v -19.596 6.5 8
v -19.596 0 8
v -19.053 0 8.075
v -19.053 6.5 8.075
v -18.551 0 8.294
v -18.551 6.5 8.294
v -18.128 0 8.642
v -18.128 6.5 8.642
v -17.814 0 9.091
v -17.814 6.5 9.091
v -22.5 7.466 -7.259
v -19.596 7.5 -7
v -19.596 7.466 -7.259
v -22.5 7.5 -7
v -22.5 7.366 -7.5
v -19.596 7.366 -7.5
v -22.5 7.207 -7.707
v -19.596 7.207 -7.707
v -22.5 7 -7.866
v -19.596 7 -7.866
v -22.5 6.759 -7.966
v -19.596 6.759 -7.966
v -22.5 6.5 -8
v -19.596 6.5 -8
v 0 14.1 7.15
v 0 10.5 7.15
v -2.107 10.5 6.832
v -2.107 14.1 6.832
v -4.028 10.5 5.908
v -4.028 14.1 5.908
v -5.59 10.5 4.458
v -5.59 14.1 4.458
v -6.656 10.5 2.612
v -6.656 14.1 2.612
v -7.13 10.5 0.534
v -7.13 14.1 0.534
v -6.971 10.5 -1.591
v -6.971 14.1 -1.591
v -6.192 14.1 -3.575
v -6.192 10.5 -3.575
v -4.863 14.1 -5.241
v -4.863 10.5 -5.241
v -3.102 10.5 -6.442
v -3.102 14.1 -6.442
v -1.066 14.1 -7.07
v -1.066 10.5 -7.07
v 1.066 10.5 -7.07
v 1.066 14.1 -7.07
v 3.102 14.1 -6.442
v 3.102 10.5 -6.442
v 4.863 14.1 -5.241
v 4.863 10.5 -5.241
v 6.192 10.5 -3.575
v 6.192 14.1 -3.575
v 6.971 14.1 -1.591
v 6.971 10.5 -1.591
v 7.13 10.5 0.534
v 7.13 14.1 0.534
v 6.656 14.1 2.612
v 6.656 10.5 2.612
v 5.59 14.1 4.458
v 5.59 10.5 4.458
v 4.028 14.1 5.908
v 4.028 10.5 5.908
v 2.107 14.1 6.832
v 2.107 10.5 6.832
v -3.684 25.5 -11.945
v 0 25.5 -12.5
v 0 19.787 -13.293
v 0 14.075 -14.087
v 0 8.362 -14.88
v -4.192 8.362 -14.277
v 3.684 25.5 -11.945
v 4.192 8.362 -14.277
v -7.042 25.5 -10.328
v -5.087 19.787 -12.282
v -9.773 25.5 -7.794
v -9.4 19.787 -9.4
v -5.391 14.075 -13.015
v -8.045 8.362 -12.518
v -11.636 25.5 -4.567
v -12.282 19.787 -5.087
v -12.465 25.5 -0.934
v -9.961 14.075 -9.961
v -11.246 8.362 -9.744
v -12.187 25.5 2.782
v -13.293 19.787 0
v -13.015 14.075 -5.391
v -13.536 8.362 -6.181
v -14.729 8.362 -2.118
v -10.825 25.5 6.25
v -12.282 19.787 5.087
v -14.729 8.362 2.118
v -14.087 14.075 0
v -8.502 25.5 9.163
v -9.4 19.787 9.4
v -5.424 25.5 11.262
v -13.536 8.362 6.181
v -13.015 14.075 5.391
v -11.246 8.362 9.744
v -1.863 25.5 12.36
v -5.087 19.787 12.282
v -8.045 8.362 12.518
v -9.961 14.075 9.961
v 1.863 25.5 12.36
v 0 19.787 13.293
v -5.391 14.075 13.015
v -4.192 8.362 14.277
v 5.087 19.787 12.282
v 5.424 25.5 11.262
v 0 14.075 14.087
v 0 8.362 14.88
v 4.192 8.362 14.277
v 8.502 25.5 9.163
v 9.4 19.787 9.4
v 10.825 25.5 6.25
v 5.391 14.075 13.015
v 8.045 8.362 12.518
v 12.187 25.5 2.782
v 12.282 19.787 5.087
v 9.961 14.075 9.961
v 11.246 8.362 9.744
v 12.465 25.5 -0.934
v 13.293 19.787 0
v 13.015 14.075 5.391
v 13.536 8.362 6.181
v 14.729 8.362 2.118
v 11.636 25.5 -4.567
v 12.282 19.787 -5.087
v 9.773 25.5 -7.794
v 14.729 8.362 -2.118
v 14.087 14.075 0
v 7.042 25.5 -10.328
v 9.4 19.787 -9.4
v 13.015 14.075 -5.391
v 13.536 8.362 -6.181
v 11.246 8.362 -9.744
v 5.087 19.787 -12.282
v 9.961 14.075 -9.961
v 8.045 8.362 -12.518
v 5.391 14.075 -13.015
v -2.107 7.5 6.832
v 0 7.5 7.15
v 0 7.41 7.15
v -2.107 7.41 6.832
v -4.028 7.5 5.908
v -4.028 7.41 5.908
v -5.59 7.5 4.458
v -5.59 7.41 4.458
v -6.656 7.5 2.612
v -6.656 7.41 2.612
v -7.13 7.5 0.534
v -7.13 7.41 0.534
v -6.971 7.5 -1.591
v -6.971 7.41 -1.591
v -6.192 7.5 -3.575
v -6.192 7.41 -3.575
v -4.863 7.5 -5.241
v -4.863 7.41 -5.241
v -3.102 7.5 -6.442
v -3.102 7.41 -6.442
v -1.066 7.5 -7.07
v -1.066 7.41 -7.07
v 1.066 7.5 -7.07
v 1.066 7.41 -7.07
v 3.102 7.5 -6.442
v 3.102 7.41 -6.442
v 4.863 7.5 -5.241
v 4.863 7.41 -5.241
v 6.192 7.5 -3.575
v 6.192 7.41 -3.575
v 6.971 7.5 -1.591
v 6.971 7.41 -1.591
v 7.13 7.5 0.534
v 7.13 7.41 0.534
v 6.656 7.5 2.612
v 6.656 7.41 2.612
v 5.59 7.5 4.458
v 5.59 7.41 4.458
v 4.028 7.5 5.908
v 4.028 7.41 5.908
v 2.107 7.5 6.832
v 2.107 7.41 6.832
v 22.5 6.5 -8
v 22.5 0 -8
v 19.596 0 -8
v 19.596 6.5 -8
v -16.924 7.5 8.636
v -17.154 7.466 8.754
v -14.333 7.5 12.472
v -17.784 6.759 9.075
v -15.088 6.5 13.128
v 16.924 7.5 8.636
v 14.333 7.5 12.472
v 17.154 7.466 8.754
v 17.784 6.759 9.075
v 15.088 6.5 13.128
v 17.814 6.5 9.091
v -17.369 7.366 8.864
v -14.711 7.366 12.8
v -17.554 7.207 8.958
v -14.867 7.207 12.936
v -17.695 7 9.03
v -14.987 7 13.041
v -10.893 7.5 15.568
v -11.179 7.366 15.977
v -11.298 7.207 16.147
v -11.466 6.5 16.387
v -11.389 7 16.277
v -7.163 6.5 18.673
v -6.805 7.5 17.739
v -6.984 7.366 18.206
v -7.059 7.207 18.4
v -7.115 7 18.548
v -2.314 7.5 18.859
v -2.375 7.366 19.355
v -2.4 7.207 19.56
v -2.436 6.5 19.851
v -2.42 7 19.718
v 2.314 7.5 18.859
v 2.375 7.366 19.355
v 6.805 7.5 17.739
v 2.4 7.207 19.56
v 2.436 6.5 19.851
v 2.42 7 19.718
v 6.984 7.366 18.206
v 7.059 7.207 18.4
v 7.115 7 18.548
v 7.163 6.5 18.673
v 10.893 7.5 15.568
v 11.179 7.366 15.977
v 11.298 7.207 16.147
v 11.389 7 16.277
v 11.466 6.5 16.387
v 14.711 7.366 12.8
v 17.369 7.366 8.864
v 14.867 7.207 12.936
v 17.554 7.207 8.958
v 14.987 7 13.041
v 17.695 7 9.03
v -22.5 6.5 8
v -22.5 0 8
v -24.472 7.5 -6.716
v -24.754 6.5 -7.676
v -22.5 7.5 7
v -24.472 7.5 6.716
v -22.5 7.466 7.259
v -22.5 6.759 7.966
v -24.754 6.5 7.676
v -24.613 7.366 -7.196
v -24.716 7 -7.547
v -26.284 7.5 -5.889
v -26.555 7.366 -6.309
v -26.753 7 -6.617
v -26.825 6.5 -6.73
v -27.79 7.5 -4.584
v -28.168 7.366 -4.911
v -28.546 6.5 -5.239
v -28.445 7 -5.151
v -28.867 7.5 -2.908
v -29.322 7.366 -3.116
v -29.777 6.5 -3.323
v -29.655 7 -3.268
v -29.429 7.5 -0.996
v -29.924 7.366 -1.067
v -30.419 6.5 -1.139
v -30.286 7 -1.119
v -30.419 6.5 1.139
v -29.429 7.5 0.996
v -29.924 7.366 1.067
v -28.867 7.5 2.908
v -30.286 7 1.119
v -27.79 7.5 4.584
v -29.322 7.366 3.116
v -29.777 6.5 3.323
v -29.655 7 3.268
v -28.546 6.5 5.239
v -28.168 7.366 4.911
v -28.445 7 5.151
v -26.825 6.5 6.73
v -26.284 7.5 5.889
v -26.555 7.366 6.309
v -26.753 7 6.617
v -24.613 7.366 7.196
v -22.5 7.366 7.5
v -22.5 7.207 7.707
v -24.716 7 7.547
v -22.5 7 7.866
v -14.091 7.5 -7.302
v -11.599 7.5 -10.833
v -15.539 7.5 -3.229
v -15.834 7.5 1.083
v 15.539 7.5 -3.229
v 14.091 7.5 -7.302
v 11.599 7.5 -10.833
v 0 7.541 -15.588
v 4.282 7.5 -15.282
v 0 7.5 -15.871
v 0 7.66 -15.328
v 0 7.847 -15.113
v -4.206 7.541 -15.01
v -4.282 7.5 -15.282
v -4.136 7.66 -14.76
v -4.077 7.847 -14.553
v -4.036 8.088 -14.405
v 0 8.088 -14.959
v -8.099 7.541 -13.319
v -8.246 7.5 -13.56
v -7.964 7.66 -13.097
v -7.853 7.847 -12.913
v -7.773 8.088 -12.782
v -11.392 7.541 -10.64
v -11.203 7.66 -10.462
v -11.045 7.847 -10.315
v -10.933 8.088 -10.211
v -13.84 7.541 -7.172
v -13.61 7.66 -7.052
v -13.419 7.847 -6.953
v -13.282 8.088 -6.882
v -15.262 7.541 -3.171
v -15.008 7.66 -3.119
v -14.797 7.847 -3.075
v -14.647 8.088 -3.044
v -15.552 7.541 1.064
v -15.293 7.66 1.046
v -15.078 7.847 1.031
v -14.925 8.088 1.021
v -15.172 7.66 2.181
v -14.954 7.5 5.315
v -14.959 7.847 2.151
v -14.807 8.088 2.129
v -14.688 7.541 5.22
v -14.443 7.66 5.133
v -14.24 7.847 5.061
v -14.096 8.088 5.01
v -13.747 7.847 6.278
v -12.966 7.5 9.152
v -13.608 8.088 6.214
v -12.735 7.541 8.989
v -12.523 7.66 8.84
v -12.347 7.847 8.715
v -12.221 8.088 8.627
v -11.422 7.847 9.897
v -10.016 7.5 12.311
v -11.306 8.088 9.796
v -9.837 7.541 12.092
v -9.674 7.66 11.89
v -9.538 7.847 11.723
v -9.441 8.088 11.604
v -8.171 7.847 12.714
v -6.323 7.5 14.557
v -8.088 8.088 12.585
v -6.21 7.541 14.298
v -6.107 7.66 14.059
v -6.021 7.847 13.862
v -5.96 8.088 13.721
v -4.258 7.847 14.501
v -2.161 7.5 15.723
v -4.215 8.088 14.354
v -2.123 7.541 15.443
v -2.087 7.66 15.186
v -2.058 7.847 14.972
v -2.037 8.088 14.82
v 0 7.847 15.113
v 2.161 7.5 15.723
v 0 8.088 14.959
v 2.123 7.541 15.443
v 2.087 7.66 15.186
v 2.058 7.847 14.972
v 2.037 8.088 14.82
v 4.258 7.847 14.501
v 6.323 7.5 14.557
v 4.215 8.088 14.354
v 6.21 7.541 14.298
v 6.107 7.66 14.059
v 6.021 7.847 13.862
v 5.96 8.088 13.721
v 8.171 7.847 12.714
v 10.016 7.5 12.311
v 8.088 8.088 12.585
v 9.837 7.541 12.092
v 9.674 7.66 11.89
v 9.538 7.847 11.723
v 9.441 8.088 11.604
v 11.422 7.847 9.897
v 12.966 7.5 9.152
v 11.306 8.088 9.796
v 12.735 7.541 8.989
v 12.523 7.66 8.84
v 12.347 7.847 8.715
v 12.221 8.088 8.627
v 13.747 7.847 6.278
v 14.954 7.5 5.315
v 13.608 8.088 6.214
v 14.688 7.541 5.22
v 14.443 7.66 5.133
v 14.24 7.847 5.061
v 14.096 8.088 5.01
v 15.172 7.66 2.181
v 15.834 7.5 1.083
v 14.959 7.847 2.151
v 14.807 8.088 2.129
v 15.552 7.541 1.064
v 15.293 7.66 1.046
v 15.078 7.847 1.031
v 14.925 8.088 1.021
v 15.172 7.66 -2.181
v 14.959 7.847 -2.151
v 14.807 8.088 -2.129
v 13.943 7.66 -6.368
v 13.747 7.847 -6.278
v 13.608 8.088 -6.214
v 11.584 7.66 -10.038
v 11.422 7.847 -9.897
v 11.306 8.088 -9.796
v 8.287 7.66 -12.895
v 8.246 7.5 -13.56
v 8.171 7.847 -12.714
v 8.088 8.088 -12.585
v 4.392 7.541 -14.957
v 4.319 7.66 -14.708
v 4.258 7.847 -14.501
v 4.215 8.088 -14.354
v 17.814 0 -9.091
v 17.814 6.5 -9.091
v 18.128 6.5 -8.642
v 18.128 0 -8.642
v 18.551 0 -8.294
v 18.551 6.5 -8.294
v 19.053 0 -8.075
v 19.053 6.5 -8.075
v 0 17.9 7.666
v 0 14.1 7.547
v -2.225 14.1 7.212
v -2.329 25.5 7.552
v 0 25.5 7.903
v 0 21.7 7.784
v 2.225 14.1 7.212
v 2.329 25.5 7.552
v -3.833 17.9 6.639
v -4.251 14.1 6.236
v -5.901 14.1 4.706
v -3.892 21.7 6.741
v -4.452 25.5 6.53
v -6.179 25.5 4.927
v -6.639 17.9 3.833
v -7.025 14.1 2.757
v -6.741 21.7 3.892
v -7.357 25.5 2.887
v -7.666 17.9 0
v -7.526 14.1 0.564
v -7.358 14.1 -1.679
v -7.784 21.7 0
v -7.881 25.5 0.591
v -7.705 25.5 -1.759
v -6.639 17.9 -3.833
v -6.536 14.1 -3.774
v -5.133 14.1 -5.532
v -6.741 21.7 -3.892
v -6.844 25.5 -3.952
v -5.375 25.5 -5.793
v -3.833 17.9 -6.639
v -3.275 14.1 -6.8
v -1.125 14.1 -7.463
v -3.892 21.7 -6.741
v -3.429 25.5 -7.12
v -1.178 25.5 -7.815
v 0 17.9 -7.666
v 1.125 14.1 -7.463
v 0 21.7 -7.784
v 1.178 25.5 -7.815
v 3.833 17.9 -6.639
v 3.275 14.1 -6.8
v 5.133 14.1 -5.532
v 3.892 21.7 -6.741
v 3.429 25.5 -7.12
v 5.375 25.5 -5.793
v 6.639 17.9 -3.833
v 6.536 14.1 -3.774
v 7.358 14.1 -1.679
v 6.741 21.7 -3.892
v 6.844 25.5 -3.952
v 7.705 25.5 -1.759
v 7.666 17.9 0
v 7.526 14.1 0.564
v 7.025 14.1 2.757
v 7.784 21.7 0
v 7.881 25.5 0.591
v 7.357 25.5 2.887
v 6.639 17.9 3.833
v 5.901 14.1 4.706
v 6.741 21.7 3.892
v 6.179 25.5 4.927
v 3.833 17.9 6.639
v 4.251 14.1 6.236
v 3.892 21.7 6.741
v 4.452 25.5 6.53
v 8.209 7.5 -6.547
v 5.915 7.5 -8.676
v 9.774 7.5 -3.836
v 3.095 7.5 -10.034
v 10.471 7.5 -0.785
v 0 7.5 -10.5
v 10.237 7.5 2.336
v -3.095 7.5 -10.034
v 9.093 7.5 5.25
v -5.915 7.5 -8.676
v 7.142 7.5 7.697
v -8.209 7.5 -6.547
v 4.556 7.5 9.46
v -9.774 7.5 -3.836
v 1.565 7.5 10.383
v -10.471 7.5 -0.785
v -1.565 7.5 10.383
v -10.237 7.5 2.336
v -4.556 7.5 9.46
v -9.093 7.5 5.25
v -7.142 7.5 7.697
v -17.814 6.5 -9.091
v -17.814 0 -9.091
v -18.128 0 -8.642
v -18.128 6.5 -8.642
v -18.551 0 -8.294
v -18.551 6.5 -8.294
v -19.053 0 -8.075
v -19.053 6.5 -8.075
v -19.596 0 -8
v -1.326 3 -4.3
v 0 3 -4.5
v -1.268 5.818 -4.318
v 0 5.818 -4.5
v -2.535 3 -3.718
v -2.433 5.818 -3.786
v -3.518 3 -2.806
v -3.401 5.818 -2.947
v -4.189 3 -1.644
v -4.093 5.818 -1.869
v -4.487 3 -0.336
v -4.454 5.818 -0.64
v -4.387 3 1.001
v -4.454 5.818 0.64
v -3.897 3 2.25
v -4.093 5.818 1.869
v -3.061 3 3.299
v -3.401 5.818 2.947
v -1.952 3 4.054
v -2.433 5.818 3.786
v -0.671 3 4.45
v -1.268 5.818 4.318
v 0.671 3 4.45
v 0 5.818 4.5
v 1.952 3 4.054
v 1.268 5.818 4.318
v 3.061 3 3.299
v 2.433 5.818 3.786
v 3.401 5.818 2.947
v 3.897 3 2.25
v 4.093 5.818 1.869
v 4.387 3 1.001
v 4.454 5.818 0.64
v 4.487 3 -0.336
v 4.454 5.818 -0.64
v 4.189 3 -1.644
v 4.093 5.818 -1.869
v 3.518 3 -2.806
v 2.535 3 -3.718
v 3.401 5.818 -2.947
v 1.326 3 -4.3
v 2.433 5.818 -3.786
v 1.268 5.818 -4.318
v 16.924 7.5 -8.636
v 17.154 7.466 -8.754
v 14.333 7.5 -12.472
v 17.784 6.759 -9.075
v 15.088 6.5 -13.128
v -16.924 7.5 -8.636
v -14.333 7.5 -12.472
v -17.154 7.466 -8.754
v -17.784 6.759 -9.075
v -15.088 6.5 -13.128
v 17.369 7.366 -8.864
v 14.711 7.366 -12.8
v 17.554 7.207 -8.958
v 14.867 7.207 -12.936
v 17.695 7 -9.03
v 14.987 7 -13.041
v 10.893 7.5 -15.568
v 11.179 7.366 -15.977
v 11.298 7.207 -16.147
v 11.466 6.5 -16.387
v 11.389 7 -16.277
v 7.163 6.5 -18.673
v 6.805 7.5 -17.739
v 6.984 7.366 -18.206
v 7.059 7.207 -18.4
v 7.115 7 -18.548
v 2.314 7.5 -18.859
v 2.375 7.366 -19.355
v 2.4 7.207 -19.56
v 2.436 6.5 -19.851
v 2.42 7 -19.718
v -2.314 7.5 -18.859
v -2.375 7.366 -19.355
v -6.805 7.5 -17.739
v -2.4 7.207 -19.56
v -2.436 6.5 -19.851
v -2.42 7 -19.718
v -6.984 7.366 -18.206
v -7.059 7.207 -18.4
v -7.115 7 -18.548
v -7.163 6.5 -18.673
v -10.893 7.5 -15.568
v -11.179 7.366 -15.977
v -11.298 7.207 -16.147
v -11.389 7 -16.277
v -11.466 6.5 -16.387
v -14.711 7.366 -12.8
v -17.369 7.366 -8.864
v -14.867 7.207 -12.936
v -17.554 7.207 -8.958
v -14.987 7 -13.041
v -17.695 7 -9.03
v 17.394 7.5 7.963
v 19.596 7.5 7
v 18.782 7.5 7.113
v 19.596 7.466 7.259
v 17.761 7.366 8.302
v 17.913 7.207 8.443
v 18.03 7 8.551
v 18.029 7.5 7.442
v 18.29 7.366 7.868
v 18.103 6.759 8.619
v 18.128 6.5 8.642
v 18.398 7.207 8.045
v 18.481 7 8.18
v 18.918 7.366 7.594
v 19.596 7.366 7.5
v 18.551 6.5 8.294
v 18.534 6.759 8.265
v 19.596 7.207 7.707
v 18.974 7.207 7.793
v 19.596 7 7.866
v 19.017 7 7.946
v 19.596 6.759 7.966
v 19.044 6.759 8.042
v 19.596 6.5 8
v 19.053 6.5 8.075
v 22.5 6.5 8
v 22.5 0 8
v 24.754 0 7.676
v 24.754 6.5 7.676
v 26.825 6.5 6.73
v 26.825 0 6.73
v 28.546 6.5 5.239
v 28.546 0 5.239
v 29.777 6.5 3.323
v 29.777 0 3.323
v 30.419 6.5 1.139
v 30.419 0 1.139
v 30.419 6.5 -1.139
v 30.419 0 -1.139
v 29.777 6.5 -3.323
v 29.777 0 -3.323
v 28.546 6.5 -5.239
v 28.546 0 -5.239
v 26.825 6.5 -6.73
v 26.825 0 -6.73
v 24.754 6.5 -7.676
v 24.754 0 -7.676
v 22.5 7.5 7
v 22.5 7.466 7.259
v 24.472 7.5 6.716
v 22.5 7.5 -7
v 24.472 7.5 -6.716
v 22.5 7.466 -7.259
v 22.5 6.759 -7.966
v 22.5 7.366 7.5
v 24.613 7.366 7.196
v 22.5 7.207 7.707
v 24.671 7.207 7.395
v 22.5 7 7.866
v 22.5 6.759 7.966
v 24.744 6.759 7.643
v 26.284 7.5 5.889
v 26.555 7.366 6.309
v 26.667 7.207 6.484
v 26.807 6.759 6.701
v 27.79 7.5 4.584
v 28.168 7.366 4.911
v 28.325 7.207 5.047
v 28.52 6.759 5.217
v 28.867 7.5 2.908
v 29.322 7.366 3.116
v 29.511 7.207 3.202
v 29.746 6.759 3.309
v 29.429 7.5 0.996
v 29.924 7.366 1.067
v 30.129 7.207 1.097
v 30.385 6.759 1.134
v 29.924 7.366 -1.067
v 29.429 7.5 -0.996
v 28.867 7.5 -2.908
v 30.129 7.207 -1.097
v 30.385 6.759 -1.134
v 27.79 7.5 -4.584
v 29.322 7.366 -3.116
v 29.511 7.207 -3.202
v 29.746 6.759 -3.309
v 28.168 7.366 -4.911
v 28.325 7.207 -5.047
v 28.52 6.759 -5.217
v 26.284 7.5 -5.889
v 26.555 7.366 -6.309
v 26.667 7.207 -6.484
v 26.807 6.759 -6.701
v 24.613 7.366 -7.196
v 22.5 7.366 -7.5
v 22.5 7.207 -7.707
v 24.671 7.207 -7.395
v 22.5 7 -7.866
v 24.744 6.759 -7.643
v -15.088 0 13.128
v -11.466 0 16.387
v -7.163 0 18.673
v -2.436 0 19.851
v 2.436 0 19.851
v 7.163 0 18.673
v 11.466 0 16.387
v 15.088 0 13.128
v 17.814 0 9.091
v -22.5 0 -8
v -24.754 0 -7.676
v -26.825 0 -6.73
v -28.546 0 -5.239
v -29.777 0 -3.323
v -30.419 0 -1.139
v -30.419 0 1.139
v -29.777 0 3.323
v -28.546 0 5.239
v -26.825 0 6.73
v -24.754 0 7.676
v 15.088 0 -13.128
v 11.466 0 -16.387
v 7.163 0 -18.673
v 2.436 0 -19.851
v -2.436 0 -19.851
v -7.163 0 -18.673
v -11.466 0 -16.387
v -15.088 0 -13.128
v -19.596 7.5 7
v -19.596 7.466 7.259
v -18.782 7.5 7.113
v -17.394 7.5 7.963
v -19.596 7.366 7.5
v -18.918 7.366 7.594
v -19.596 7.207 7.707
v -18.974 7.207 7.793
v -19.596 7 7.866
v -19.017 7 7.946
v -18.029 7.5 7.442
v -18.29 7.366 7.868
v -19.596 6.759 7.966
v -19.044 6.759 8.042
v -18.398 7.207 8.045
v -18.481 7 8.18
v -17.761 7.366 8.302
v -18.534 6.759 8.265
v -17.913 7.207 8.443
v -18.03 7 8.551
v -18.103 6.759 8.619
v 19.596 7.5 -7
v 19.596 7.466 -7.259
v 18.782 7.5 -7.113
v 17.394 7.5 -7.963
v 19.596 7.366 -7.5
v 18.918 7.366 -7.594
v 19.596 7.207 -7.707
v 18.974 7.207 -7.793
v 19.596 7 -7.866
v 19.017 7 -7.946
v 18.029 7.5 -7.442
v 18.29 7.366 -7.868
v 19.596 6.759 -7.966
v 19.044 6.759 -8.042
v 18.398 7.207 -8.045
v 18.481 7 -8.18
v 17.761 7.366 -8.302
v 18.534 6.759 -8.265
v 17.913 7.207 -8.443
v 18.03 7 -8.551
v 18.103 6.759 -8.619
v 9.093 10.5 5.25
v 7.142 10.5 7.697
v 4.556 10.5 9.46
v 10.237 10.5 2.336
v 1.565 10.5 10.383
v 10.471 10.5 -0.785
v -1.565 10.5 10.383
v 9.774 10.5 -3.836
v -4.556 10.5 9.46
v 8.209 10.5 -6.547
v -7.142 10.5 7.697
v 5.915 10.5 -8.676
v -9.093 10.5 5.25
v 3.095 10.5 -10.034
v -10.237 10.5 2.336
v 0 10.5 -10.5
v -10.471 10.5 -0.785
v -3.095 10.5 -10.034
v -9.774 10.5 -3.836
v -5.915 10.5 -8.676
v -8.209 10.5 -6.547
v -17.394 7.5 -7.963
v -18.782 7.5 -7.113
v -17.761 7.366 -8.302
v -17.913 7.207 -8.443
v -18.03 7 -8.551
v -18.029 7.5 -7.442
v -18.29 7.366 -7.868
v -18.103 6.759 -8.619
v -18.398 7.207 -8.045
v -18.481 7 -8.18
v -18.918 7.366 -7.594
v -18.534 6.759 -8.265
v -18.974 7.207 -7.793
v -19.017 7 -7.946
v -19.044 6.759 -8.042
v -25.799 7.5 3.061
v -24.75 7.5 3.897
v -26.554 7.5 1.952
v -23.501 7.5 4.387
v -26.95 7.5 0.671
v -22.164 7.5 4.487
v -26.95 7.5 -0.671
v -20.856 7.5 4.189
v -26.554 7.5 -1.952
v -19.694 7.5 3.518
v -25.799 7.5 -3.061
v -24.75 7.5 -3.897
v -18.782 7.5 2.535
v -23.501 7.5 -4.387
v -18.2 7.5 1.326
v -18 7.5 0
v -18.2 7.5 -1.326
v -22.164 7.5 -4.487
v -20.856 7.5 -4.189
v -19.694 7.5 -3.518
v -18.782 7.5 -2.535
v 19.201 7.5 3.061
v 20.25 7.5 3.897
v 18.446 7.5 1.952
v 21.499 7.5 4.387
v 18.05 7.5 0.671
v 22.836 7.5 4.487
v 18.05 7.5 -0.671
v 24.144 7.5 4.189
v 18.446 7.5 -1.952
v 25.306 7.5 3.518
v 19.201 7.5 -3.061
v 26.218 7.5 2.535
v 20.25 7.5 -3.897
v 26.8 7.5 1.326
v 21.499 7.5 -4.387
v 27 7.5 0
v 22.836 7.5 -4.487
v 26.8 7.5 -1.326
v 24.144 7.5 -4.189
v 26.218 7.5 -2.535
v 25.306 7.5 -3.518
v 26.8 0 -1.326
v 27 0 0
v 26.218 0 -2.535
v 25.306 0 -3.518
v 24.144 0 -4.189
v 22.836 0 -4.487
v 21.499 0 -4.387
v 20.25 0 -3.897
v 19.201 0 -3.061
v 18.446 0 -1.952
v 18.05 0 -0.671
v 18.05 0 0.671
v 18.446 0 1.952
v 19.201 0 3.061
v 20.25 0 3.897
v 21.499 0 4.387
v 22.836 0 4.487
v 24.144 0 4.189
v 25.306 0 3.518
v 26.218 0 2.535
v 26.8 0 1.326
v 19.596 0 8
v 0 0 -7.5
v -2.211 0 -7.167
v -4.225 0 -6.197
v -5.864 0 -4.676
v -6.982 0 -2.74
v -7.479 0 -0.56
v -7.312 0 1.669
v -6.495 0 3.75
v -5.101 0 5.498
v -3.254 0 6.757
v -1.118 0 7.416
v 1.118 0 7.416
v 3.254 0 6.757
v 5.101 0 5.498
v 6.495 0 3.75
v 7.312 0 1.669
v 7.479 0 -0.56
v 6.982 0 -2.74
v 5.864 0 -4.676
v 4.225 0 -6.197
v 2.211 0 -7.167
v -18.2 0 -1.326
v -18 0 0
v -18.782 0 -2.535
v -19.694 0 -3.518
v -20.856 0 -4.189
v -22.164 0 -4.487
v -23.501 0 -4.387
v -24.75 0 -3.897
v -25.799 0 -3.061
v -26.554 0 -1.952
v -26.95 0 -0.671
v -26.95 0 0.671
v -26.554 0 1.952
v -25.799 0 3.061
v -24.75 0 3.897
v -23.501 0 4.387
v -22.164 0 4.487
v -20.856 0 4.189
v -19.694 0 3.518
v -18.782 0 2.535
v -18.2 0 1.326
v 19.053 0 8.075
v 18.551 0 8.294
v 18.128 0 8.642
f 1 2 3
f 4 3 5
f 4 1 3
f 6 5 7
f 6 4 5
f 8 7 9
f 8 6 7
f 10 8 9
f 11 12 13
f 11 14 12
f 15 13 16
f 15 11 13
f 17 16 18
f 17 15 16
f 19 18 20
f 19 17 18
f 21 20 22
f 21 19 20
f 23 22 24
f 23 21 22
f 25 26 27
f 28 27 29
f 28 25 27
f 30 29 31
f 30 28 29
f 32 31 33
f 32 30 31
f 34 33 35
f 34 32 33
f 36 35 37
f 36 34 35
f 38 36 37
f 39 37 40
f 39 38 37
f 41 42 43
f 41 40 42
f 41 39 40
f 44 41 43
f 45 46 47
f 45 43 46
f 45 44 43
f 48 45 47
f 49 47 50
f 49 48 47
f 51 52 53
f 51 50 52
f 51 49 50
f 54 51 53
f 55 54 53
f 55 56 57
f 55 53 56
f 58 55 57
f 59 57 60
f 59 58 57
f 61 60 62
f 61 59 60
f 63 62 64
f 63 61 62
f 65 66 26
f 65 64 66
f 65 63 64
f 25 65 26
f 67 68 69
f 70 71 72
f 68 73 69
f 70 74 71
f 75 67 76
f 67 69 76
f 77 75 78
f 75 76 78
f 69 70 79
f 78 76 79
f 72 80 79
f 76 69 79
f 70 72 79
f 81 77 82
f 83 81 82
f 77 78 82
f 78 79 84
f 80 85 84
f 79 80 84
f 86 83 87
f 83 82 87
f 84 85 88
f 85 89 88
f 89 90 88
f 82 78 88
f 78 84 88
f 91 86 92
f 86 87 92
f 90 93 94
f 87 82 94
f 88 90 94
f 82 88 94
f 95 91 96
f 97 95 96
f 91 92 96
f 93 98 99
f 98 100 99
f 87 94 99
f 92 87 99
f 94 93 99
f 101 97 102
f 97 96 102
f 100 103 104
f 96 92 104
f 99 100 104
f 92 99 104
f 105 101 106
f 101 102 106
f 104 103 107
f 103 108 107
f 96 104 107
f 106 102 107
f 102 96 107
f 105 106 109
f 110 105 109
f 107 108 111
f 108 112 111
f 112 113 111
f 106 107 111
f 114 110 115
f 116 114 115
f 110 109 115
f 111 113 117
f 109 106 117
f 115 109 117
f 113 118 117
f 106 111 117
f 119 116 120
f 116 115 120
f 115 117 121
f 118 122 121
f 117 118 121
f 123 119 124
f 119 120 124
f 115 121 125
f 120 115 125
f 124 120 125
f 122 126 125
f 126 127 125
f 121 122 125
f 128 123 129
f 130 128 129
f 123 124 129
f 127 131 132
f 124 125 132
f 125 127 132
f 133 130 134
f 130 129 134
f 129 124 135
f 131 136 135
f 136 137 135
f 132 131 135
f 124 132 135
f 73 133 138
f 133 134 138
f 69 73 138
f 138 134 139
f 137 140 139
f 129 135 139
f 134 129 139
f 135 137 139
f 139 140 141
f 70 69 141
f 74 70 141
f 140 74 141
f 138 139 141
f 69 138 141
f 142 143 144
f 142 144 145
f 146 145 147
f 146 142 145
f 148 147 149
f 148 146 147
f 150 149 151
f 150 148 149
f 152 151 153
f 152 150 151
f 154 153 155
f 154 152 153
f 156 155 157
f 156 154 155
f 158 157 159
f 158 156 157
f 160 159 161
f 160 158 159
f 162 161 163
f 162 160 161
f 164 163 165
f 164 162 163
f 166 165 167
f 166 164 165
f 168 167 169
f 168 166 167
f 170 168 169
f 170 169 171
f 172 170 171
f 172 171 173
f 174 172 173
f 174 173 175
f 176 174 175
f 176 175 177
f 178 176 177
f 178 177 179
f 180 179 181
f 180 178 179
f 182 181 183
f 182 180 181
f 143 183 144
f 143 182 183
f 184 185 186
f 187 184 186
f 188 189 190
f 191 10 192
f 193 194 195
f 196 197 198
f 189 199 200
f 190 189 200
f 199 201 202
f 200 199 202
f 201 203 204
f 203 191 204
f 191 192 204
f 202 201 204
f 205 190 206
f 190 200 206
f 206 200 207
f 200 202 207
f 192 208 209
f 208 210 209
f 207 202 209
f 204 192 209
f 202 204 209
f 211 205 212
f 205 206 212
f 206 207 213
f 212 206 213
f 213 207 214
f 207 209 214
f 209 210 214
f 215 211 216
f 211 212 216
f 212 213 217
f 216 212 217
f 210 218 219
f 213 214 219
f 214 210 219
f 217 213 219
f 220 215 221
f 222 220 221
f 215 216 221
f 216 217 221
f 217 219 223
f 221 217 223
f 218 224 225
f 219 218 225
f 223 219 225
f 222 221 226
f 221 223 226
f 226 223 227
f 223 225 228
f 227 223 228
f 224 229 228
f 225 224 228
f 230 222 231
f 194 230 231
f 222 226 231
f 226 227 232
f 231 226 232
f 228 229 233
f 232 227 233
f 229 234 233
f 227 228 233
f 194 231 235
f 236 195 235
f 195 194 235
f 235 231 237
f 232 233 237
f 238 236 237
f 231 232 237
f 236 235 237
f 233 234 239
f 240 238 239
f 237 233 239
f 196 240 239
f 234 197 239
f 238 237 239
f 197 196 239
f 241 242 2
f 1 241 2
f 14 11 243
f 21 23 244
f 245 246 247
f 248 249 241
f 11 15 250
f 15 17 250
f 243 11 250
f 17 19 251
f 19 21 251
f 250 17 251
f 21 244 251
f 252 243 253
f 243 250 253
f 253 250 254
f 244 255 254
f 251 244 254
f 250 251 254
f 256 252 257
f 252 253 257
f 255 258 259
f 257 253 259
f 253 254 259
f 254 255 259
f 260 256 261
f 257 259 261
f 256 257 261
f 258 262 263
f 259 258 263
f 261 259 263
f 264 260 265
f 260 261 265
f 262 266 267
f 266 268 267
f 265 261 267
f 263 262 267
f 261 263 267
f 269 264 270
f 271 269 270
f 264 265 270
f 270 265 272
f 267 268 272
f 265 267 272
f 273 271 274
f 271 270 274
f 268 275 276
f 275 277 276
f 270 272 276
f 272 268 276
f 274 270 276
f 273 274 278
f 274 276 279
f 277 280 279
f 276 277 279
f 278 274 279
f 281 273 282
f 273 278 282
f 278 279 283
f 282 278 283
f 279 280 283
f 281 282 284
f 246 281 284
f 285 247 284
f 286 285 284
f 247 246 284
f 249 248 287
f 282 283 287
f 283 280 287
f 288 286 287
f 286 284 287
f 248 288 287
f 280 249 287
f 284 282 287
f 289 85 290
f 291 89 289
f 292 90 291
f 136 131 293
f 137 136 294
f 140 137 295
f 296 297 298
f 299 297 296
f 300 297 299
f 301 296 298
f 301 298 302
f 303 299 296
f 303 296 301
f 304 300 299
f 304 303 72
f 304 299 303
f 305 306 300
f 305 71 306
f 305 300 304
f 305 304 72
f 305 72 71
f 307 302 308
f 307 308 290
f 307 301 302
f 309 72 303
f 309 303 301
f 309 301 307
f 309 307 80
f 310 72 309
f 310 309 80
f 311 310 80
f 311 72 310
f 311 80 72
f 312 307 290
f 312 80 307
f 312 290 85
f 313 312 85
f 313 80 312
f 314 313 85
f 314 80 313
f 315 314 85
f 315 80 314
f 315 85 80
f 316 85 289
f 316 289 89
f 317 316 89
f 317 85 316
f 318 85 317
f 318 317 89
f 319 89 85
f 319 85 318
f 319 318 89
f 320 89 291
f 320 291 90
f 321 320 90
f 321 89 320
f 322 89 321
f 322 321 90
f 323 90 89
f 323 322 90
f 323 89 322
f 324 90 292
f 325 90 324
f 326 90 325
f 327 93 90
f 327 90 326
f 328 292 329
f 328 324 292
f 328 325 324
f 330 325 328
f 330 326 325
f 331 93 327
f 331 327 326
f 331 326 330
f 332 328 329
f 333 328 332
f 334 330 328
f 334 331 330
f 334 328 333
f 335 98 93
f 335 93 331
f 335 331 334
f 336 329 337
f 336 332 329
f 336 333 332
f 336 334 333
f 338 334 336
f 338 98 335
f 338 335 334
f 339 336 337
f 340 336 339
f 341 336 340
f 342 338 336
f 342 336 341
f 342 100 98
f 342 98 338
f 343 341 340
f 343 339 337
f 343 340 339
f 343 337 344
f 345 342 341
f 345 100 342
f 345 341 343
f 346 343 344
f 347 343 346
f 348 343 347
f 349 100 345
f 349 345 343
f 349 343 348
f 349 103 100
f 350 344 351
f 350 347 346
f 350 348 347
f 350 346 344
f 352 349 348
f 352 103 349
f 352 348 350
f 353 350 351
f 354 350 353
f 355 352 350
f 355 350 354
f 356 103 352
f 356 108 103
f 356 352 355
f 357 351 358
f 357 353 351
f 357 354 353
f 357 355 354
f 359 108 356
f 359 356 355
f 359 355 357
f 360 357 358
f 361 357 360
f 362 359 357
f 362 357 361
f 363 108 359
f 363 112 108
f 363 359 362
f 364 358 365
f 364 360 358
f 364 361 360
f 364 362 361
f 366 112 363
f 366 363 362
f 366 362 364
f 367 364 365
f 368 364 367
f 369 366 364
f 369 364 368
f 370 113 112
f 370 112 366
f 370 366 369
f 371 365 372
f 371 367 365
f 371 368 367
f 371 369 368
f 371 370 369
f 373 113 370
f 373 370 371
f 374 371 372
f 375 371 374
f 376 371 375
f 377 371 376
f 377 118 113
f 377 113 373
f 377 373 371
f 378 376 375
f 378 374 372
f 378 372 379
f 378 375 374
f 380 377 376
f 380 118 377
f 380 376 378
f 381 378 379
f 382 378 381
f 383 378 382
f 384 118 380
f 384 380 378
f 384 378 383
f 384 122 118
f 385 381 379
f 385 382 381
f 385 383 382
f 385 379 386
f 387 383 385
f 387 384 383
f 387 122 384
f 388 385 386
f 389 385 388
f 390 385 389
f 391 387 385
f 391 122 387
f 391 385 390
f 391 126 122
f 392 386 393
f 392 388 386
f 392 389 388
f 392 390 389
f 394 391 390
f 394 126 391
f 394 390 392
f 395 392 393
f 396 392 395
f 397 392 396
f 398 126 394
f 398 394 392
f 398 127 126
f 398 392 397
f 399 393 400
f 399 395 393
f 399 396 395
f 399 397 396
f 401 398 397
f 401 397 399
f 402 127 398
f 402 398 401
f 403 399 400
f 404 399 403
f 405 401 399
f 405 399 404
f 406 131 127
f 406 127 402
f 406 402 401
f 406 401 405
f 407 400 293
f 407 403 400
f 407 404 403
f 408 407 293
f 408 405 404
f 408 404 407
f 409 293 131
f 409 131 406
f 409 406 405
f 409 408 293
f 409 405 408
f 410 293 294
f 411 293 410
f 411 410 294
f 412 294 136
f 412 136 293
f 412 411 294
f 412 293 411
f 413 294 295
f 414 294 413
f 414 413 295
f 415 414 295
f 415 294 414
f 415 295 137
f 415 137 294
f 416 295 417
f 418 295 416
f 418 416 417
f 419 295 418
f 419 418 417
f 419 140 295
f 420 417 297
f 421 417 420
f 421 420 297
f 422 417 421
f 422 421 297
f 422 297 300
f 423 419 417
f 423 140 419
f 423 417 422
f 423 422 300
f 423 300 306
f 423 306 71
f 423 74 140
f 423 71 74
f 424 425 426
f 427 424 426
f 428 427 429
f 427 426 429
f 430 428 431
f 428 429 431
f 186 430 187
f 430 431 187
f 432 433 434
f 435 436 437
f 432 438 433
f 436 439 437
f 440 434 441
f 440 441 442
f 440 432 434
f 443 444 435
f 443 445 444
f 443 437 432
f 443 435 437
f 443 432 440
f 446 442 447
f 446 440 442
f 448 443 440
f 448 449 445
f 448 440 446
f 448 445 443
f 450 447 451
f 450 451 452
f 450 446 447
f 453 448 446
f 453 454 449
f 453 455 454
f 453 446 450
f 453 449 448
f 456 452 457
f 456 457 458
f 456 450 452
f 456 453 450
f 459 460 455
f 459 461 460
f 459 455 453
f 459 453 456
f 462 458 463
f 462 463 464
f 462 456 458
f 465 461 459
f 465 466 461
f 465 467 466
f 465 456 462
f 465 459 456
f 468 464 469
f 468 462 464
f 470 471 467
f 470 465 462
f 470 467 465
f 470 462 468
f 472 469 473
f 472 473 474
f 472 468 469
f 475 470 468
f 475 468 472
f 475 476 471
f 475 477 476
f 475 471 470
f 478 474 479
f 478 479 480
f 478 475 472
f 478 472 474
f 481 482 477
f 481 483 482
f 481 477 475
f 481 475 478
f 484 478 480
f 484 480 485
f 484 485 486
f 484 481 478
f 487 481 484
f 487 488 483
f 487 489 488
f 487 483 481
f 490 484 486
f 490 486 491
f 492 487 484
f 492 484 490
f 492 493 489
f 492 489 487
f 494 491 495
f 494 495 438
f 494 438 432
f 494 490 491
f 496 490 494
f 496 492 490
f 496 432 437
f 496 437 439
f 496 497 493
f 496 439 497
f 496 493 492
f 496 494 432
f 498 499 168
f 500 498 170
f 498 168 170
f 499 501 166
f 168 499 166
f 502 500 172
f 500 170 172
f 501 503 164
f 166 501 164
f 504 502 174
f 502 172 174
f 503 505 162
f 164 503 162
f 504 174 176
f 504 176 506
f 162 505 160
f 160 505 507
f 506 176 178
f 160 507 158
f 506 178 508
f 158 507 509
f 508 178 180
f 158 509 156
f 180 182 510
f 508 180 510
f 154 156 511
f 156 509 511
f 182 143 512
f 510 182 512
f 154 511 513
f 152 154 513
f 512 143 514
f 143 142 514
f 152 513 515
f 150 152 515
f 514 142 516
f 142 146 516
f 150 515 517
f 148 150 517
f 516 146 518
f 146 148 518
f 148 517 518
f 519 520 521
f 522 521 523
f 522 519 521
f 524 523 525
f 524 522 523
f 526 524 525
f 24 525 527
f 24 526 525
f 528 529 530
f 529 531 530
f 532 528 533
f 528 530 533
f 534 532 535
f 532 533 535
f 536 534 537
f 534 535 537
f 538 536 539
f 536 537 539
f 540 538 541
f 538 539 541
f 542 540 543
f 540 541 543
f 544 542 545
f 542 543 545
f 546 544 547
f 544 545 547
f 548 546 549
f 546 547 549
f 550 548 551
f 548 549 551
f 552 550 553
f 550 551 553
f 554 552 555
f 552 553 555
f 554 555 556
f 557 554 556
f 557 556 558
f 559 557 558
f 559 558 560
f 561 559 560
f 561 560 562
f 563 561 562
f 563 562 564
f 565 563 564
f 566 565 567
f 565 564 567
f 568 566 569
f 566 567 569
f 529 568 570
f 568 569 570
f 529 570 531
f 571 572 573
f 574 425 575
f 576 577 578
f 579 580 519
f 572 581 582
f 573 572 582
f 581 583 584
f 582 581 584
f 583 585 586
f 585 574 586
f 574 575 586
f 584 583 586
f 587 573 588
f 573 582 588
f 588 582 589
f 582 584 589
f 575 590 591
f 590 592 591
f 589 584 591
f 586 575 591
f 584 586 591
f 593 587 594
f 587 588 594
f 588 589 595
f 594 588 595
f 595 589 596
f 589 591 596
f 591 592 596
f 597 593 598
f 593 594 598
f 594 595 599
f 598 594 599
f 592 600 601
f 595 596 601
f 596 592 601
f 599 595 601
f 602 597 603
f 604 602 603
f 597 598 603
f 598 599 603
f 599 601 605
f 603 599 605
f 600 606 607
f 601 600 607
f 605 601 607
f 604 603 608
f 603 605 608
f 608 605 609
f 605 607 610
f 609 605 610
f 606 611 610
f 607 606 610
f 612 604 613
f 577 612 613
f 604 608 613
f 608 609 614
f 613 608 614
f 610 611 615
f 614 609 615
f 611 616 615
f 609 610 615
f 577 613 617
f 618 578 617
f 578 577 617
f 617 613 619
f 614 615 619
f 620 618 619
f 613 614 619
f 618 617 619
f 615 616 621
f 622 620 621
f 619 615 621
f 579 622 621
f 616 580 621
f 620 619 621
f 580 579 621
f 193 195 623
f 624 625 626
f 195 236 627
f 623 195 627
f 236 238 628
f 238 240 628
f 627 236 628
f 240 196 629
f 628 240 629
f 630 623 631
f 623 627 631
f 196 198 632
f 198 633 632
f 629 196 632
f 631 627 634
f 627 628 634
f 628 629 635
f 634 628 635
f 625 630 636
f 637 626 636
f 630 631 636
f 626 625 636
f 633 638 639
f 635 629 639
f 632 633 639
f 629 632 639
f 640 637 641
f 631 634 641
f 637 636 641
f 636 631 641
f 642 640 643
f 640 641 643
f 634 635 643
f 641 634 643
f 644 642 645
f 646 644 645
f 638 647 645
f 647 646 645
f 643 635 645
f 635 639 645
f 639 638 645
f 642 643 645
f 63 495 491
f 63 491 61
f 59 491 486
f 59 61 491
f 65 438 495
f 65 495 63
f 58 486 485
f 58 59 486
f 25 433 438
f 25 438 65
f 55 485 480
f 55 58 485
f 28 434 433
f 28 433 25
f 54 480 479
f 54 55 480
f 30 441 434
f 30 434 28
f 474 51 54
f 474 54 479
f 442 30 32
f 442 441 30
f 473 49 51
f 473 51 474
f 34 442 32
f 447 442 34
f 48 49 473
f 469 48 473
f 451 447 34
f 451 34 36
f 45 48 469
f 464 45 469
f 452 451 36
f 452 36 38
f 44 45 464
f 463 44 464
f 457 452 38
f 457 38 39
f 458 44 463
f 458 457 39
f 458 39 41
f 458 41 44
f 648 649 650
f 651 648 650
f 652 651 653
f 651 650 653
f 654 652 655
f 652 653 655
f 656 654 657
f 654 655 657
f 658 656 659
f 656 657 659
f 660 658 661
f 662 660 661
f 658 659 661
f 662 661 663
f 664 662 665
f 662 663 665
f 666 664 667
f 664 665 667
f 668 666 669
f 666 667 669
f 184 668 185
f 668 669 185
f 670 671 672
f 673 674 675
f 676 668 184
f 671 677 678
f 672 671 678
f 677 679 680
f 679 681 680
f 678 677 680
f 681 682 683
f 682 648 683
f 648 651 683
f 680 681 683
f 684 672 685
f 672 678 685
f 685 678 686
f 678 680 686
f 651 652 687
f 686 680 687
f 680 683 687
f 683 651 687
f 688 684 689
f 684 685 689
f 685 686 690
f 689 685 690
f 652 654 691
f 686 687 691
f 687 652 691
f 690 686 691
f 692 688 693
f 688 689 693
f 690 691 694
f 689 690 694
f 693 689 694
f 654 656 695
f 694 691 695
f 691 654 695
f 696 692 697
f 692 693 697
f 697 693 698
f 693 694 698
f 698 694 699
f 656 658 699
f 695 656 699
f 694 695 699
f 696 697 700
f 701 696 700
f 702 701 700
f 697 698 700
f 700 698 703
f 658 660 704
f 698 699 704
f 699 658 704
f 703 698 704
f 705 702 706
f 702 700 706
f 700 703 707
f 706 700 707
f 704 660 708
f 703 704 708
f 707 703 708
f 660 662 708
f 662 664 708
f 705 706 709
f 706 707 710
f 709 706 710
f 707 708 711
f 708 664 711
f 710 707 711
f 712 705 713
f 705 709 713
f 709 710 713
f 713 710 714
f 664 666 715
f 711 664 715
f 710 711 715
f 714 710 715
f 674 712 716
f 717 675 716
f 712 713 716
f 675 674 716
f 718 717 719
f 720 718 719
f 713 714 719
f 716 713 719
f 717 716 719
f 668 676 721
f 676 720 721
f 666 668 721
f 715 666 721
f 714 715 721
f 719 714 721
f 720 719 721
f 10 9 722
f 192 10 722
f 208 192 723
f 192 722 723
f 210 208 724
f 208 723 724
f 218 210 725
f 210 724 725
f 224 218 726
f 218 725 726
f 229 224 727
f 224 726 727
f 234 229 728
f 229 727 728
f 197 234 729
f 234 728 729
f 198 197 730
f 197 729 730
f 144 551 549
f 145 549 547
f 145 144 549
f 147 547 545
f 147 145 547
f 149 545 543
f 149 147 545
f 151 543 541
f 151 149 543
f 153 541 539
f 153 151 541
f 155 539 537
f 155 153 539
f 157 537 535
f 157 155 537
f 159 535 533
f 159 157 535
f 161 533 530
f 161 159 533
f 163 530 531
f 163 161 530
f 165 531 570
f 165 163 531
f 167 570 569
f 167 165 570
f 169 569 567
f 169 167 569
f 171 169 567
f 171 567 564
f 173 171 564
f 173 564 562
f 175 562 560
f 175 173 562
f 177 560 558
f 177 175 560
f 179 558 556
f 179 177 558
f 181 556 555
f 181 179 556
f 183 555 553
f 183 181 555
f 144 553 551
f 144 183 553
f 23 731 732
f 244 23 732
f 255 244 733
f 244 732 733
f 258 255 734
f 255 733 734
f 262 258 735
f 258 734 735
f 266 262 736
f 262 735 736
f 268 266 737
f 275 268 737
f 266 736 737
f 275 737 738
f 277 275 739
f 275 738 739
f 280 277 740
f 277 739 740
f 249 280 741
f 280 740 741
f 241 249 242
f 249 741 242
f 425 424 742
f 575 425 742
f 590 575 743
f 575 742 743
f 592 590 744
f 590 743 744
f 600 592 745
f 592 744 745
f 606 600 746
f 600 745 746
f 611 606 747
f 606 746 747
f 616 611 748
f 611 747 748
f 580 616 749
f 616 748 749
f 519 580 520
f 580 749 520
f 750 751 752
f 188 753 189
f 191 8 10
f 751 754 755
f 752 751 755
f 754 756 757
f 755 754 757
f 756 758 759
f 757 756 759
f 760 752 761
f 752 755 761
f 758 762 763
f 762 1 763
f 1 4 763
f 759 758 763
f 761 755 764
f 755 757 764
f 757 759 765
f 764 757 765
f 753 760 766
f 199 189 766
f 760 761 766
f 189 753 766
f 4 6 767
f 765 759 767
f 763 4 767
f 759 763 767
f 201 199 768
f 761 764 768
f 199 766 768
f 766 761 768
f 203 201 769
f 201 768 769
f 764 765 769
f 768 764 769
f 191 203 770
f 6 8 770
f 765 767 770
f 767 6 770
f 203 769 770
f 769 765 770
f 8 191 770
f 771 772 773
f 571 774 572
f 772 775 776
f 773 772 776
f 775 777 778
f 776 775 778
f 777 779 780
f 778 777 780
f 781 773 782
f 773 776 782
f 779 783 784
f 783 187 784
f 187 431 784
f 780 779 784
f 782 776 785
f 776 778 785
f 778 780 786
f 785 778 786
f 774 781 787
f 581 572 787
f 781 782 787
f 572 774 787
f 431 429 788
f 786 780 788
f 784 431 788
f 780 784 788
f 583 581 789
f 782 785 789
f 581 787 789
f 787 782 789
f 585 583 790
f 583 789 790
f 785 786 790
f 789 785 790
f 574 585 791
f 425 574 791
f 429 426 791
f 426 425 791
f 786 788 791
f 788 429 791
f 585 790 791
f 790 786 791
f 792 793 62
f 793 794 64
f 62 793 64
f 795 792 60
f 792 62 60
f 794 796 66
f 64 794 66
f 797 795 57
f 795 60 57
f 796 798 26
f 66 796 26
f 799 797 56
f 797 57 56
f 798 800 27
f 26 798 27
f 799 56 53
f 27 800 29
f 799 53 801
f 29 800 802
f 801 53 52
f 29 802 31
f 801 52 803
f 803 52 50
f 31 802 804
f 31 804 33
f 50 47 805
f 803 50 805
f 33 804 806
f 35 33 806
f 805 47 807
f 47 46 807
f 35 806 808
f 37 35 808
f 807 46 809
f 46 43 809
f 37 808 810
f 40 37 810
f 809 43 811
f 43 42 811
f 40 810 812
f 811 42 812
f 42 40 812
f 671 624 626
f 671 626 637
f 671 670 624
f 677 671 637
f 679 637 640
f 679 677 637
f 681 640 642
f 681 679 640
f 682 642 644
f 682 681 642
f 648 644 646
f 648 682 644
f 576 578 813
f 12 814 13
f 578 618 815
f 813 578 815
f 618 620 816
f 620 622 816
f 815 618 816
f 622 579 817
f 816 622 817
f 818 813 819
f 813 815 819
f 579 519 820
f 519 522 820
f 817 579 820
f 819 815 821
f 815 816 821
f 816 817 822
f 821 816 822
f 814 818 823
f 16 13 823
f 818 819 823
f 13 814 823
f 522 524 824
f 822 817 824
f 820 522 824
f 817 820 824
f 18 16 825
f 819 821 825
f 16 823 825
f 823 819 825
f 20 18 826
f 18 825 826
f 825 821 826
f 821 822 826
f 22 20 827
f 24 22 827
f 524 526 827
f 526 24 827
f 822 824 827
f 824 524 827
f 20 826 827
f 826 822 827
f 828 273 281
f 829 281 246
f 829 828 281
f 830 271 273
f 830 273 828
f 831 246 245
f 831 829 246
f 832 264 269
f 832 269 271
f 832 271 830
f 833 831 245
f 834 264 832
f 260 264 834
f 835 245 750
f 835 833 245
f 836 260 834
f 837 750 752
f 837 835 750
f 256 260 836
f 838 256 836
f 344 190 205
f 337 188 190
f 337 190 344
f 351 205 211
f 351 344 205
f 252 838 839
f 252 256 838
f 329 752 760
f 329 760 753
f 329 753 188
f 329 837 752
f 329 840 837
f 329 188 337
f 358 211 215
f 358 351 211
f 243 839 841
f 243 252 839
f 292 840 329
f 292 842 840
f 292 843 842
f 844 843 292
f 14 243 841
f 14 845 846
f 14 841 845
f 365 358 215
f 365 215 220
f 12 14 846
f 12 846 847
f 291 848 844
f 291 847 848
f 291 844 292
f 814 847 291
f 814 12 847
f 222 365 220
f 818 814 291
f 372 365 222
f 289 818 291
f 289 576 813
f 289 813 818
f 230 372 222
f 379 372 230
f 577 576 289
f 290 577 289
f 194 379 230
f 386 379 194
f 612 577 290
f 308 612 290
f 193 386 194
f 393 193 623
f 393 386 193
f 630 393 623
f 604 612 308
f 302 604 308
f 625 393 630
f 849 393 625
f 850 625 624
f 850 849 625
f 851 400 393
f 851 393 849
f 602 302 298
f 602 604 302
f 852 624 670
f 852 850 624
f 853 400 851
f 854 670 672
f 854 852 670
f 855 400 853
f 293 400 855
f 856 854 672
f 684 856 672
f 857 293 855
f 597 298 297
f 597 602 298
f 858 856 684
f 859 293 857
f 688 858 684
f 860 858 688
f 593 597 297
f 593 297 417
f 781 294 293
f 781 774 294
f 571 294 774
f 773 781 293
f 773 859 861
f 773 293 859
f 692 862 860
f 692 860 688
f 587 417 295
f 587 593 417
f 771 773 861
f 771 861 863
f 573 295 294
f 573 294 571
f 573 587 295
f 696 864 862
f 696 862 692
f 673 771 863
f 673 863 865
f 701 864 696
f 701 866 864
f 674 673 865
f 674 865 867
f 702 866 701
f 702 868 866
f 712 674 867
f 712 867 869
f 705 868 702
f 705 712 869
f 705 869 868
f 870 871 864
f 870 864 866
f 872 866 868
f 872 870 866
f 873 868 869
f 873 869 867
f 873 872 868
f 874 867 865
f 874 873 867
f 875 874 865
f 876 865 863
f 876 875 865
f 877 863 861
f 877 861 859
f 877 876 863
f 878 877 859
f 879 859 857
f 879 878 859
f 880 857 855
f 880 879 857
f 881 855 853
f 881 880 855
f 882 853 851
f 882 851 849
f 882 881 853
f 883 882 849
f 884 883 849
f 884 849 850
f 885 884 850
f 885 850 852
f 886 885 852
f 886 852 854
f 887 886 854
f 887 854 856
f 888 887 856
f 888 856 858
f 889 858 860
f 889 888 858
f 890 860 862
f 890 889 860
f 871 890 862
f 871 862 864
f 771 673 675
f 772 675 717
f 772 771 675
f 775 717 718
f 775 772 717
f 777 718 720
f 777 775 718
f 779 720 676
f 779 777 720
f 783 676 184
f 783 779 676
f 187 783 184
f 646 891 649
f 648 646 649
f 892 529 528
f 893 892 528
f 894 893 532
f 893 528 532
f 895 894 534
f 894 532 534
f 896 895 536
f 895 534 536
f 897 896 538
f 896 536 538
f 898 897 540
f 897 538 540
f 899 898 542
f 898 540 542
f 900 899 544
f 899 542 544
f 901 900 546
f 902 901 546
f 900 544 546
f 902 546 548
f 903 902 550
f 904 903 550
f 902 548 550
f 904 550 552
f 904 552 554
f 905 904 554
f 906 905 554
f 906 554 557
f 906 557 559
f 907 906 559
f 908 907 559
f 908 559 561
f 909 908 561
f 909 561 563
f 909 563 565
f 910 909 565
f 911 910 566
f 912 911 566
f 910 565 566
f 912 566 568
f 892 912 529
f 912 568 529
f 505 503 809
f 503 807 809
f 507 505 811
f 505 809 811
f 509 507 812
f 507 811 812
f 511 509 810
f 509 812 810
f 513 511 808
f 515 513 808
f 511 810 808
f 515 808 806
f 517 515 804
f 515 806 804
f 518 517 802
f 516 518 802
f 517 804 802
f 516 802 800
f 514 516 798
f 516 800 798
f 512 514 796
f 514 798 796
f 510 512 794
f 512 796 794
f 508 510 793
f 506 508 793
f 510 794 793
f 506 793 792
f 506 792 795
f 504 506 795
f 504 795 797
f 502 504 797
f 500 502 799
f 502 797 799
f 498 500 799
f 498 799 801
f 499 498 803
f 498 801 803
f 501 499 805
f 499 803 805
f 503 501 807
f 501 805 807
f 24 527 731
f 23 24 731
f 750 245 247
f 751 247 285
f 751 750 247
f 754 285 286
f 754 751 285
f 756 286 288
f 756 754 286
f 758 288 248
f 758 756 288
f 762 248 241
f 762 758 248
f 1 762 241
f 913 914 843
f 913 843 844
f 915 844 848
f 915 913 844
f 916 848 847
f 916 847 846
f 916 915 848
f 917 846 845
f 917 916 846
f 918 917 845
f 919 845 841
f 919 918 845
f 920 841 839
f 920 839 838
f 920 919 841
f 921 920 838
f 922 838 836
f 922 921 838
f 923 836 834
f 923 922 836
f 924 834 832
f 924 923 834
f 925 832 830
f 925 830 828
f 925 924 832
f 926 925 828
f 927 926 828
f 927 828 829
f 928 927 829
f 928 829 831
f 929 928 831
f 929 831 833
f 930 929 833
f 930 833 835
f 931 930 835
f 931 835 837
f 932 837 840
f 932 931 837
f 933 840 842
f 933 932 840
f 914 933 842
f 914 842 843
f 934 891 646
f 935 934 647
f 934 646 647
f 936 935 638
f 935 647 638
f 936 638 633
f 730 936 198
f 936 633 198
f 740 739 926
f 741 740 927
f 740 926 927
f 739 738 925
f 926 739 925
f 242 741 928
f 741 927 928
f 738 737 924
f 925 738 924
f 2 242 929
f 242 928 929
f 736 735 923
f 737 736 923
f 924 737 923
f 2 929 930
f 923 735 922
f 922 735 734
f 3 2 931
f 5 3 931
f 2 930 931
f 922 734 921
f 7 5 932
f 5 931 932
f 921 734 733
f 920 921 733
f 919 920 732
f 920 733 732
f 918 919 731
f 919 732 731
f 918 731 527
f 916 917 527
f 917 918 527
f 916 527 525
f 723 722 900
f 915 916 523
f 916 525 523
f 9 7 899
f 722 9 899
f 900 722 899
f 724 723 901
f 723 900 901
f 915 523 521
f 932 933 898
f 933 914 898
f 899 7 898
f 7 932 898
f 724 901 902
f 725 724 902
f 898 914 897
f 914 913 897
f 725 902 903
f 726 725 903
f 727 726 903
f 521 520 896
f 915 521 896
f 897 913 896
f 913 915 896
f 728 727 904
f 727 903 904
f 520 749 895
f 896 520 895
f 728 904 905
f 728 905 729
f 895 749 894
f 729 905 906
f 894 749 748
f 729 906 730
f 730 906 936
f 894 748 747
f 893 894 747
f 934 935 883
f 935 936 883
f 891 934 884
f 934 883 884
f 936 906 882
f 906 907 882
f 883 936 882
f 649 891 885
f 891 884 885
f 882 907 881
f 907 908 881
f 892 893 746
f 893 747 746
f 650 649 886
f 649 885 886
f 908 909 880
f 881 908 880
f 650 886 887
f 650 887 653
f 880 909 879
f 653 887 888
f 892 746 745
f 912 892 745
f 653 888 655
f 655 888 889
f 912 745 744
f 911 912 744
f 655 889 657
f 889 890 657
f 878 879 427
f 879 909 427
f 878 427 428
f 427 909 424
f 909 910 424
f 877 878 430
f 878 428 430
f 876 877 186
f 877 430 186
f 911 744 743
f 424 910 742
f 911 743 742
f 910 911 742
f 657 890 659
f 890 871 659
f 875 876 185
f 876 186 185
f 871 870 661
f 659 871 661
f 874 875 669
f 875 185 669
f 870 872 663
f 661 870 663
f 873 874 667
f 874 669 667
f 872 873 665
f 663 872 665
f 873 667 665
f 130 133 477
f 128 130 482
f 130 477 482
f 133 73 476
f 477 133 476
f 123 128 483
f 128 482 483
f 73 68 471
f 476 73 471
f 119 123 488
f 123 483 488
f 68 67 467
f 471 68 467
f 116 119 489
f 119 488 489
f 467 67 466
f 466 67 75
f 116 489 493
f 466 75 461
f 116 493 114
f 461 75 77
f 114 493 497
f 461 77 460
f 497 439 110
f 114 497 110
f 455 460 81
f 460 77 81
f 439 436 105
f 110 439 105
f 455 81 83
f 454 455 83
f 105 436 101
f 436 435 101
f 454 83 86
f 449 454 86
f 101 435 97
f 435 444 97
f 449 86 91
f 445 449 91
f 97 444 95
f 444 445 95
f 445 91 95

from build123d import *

# Parameters (mm, degrees)
EXTRUDE_1_OUTLINE_R = 4.5
EXTRUDE_1_DEPTH     = 7.5
FILLET_1_R          = 2
FILLET_2_R          = 1
CHAMFER_1_SIZE      = 3


# Read off the part's stored shape, not the designer's step: 伸長1
with BuildPart() as part:
    # 伸長1 outline → 伸長1 (new body)
    with BuildSketch(Plane(origin=(0, 0, 0), x_dir=(1, 0, 0), z_dir=(0, 1, 0))):
        with BuildLine():
            ThreePointArc((18.33030278, 8), (0, 20), (-18.33030278, 8))
            Line((-18.33030278, 8), (-22.5, 8))
            ThreePointArc((-22.5, 8), (-30.5, 0), (-22.5, -8))
            Line((-22.5, -8), (-18.33030278, -8))
            ThreePointArc((-18.33030278, -8), (0, -20), (18.33030278, -8))
            Line((18.33030278, -8), (22.5, -8))
            ThreePointArc((22.5, -8), (30.5, 0), (22.5, 8))
            Line((22.5, 8), (18.33030278, 8))
        make_face()
        with Locations((-22.5, 0)):
            Circle(EXTRUDE_1_OUTLINE_R, mode=Mode.SUBTRACT)
        with Locations((22.5, 0)):
            Circle(EXTRUDE_1_OUTLINE_R, mode=Mode.SUBTRACT)
    extrude(amount=EXTRUDE_1_DEPTH)

    # 圓角1
    fillet_1_edges = [part.edges().sort_by_distance(p)[0] for p in [
        (18.33030278, 3.75, -8),
        (18.33030278, 3.75, 8),
        (-18.33030278, 3.75, 8),
        (-18.33030278, 3.75, -8),
    ]]
    fillet(fillet_1_edges, radius=FILLET_1_R)

    # 草圖3 → 旋轉1 (revolve)
    with BuildSketch(Plane.XY, mode=Mode.PRIVATE) as revolve_1_sk:
        Polygon((0, 25.5), (12.5, 25.5), (15, 7.5), (0, 7.5), align=None)
    revolve(revolve_1_sk.sketch.rotate(Axis((0, 0, 0), (0, 1, 0)), 90), axis=Axis((0, 0, 0), (0, 1, 0)))

    # 圓角2
    fillet_2_edges = [part.edges().sort_by_distance(p)[0] for p in [
        (-30.5, 7.5, 0),
        (-21.047958971, 7.5, 8),
        (30.5, 7.5, 0),
        (21.047958971, 7.5, -8),
        (21.047958971, 7.5, 8),
        (0, 7.5, 20),
        (0, 7.5, -20),
        (-21.047958971, 7.5, -8),
        (18.551452007, 7.5, 8.294394269),
        (18.551452007, 7.5, -8.294394269),
        (-18.551452007, 7.5, -8.294394269),
        (-18.551452007, 7.5, 8.294394269),
        (0, 7.5, 15),
    ]]
    fillet(fillet_2_edges, radius=FILLET_2_R)

    # 草圖4 → 除料-旋轉1 (revolve, cut)
    with BuildSketch(Plane.XY, mode=Mode.PRIVATE) as cut_revolve_1_sk:
        Polygon((0, 0), (4.5, 0), (4.5, 7.5), (10.5, 7.5), (10.5, 10.5), (0, 10.5), align=None)
    revolve(cut_revolve_1_sk.sketch.rotate(Axis((0, 0, 0), (0, 1, 0)), 90), axis=Axis((0, 0, 0), (0, 1, 0)), mode=Mode.SUBTRACT)

    # 導角1
    chamfer_1_edges = [part.edges().sort_by_distance(p)[0] for p in [
        (0, 0, 4.5),
    ]]
    chamfer(chamfer_1_edges, length=CHAMFER_1_SIZE)

    # 草圖7 → 3/8 Rc 螺紋孔1 (revolve, cut)
    with BuildSketch(Plane(origin=(0, 25.5, 0), x_dir=(0, 0, 1), z_dir=(1, 0, 0))):
        Polygon((0, 0), (0, 22.386153426), (7.15, 18.09), (7.15, 11.4), (7.54713052, 11.4), (7.903, 0), align=None)
    revolve(axis=Axis((0, 31.85, 0), (0, -1, 0)), mode=Mode.SUBTRACT)


solid = part.part
